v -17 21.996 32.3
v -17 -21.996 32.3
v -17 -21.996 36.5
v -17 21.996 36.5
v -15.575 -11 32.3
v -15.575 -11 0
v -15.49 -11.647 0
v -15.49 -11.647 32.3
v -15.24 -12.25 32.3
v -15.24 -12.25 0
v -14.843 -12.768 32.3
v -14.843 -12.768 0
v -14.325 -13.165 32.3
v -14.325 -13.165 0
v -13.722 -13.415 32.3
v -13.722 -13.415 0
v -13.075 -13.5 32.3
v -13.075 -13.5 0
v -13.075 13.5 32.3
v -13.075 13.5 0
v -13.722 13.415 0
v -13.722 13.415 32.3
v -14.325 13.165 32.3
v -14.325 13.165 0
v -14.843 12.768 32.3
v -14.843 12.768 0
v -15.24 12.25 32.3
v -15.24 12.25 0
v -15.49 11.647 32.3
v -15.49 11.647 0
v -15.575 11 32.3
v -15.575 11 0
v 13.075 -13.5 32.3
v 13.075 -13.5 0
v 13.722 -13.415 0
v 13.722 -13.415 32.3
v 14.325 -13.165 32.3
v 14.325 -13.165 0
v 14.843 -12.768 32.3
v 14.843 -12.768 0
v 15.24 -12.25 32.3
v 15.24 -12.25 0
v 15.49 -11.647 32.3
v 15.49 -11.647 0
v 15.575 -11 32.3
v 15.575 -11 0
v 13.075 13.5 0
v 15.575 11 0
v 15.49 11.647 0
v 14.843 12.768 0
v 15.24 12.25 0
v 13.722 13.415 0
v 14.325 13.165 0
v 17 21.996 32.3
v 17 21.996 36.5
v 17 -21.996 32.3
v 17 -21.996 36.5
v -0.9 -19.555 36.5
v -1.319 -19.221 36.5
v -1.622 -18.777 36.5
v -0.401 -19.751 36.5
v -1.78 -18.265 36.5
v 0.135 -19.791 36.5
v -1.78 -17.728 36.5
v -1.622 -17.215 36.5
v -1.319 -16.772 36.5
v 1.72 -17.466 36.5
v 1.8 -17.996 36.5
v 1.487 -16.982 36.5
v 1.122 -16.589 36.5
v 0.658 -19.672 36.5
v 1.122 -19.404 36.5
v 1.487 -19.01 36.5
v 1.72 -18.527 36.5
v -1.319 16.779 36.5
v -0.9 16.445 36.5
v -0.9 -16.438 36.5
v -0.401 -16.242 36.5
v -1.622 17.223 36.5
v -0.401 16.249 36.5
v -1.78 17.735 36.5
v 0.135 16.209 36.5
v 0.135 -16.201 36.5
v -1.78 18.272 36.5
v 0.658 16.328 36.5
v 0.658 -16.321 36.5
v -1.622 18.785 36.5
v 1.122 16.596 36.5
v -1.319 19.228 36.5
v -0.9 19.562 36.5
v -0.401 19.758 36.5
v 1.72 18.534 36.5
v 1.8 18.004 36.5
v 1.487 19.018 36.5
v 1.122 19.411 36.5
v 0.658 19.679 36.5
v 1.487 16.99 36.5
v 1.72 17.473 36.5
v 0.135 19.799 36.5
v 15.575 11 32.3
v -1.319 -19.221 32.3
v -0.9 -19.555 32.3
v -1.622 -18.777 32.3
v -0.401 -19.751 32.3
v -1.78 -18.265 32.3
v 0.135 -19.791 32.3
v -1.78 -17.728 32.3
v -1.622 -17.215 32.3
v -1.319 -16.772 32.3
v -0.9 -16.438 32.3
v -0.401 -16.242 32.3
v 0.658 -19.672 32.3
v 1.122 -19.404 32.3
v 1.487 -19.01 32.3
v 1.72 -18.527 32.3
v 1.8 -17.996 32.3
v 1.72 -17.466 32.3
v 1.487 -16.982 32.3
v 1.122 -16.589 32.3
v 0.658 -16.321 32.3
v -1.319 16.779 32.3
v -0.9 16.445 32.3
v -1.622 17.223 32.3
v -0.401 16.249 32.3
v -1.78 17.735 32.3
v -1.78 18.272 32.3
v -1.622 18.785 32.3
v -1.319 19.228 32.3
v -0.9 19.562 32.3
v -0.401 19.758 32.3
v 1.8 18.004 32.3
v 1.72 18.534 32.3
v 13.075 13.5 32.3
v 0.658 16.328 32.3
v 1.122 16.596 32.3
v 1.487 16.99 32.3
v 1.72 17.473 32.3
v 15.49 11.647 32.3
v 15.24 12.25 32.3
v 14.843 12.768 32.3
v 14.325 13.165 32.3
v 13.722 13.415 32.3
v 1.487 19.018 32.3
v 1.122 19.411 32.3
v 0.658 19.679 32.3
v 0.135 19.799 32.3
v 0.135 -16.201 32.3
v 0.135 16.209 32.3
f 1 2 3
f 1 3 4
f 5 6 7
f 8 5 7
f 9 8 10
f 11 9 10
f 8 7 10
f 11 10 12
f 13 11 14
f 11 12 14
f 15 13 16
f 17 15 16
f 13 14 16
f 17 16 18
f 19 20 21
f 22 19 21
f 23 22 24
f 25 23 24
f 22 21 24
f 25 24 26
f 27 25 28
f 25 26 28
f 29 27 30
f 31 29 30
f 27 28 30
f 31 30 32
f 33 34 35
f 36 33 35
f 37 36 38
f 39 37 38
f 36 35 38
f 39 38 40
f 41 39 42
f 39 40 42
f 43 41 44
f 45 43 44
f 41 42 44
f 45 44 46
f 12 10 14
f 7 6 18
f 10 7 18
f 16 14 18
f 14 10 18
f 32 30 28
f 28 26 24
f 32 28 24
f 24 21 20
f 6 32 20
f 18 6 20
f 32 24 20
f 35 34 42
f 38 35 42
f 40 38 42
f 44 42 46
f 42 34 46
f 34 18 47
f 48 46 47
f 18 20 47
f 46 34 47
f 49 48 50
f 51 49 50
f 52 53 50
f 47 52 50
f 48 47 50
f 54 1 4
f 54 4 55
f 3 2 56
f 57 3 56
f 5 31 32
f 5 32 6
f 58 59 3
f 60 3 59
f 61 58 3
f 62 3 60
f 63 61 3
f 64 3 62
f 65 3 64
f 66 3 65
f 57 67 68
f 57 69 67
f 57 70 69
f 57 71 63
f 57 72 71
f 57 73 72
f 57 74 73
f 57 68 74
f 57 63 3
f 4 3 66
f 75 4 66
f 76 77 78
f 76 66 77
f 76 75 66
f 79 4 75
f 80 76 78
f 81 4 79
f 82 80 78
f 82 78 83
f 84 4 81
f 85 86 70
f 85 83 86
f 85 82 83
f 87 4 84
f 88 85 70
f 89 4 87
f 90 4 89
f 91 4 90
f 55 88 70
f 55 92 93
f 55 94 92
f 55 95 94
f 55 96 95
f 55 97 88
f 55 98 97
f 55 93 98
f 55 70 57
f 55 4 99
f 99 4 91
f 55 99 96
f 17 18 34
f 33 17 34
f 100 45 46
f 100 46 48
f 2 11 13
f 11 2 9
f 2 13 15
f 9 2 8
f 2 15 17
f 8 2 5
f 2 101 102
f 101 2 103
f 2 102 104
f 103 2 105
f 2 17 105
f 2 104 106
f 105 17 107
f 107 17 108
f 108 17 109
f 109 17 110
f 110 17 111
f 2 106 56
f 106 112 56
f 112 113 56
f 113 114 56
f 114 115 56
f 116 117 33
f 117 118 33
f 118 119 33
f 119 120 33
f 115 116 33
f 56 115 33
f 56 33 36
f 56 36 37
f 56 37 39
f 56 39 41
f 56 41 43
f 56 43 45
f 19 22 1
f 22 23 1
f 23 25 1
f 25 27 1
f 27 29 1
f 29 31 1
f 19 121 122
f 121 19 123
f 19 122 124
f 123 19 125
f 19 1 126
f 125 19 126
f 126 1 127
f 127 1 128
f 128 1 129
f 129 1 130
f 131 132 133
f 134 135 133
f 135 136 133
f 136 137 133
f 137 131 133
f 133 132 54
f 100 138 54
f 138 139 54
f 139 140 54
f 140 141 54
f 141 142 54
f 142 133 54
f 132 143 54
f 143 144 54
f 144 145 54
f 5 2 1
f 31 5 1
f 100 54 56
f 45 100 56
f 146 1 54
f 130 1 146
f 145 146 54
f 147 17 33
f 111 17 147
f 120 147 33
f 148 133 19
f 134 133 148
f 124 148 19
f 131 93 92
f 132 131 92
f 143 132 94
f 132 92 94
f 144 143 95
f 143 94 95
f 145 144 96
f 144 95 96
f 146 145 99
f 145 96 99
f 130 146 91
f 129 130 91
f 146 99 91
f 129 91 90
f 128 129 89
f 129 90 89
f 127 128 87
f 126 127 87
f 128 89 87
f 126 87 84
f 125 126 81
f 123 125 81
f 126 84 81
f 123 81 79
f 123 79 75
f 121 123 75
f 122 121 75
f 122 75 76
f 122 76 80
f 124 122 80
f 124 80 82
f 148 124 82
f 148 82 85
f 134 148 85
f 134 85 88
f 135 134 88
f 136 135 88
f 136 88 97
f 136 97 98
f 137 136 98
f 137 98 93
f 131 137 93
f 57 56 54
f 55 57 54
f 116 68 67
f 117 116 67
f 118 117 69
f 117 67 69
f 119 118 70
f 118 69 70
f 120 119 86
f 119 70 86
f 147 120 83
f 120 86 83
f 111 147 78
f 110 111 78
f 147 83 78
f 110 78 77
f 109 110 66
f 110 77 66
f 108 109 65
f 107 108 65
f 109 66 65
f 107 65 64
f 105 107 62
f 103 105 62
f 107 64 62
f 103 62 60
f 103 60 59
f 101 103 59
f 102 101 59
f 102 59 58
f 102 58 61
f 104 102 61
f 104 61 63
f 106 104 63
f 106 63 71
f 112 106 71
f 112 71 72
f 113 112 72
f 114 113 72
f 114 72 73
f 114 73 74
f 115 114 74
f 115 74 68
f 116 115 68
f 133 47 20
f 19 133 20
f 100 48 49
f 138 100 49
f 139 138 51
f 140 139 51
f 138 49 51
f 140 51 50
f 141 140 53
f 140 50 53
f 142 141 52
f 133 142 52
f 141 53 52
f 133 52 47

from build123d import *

# Parameters (mm, degrees)
F1_DEPTH = 32.3
F2_W     = 34
F2_H     = 43.9928
F3_DEPTH = 4.2
F4_R     = 1.8
F5_DEPTH = 25.4


with BuildPart() as f1:
    # F0 (on Top) → F1 (new body)
    with BuildSketch(Plane.XY):
        with BuildLine():
            Line((-13.075, -13.5), (13.075, -13.5))
            ThreePointArc((13.075, -13.5), (14.842766953, -12.767766953), (15.575, -11))
            Line((15.575, -11), (15.575, 11))
            ThreePointArc((15.575, 11), (14.842766953, 12.767766953), (13.075, 13.5))
            Line((13.075, 13.5), (-13.075, 13.5))
            ThreePointArc((-13.075, 13.5), (-14.842766953, 12.767766953), (-15.575, 11))
            Line((-15.575, 11), (-15.575, -11))
            ThreePointArc((-15.575, -11), (-14.842766953, -12.767766953), (-13.075, -13.5))
        make_face()
    extrude(amount=F1_DEPTH)

    # F2 (on face) → F3 (join)
    with BuildSketch(Plane.XY.offset(32.3)):
        Rectangle(F2_W, F2_H)
        with BuildLine():
            Line((-15.575, -11), (-15.575, 11))
            ThreePointArc((-15.575, 11), (-14.842766953, 12.767766953), (-13.075, 13.5))
            Line((-13.075, 13.5), (13.075, 13.5))
            ThreePointArc((13.075, 13.5), (14.842766953, 12.767766953), (15.575, 11))
            Line((15.575, 11), (15.575, -11))
            ThreePointArc((15.575, -11), (14.842766953, -12.767766953), (13.075, -13.5))
            Line((13.075, -13.5), (-13.075, -13.5))
            ThreePointArc((-13.075, -13.5), (-14.842766953, -12.767766953), (-15.575, -11))
        make_face(mode=Mode.SUBTRACT)
        with BuildLine():
            ThreePointArc((-13.075, 13.5), (-14.842766953, 12.767766953), (-15.575, 11))
            Line((-15.575, 11), (-15.575, -11))
            ThreePointArc((-15.575, -11), (-14.842766953, -12.767766953), (-13.075, -13.5))
            Line((-13.075, -13.5), (13.075, -13.5))
            ThreePointArc((13.075, -13.5), (14.842766953, -12.767766953), (15.575, -11))
            Line((15.575, -11), (15.575, 11))
            ThreePointArc((15.575, 11), (14.842766953, 12.767766953), (13.075, 13.5))
            Line((13.075, 13.5), (-13.075, 13.5))
        make_face()
    extrude(amount=F3_DEPTH)

    # F4 (on face) → F5 (cut)
    with BuildSketch(Plane.XY.offset(36.5)):
        with Locations((0, 18.0036)):
            Circle(F4_R)
        with Locations((0, -17.9964)):
            Circle(F4_R)
    extrude(amount=-F5_DEPTH, mode=Mode.SUBTRACT)


solid = f1.part
